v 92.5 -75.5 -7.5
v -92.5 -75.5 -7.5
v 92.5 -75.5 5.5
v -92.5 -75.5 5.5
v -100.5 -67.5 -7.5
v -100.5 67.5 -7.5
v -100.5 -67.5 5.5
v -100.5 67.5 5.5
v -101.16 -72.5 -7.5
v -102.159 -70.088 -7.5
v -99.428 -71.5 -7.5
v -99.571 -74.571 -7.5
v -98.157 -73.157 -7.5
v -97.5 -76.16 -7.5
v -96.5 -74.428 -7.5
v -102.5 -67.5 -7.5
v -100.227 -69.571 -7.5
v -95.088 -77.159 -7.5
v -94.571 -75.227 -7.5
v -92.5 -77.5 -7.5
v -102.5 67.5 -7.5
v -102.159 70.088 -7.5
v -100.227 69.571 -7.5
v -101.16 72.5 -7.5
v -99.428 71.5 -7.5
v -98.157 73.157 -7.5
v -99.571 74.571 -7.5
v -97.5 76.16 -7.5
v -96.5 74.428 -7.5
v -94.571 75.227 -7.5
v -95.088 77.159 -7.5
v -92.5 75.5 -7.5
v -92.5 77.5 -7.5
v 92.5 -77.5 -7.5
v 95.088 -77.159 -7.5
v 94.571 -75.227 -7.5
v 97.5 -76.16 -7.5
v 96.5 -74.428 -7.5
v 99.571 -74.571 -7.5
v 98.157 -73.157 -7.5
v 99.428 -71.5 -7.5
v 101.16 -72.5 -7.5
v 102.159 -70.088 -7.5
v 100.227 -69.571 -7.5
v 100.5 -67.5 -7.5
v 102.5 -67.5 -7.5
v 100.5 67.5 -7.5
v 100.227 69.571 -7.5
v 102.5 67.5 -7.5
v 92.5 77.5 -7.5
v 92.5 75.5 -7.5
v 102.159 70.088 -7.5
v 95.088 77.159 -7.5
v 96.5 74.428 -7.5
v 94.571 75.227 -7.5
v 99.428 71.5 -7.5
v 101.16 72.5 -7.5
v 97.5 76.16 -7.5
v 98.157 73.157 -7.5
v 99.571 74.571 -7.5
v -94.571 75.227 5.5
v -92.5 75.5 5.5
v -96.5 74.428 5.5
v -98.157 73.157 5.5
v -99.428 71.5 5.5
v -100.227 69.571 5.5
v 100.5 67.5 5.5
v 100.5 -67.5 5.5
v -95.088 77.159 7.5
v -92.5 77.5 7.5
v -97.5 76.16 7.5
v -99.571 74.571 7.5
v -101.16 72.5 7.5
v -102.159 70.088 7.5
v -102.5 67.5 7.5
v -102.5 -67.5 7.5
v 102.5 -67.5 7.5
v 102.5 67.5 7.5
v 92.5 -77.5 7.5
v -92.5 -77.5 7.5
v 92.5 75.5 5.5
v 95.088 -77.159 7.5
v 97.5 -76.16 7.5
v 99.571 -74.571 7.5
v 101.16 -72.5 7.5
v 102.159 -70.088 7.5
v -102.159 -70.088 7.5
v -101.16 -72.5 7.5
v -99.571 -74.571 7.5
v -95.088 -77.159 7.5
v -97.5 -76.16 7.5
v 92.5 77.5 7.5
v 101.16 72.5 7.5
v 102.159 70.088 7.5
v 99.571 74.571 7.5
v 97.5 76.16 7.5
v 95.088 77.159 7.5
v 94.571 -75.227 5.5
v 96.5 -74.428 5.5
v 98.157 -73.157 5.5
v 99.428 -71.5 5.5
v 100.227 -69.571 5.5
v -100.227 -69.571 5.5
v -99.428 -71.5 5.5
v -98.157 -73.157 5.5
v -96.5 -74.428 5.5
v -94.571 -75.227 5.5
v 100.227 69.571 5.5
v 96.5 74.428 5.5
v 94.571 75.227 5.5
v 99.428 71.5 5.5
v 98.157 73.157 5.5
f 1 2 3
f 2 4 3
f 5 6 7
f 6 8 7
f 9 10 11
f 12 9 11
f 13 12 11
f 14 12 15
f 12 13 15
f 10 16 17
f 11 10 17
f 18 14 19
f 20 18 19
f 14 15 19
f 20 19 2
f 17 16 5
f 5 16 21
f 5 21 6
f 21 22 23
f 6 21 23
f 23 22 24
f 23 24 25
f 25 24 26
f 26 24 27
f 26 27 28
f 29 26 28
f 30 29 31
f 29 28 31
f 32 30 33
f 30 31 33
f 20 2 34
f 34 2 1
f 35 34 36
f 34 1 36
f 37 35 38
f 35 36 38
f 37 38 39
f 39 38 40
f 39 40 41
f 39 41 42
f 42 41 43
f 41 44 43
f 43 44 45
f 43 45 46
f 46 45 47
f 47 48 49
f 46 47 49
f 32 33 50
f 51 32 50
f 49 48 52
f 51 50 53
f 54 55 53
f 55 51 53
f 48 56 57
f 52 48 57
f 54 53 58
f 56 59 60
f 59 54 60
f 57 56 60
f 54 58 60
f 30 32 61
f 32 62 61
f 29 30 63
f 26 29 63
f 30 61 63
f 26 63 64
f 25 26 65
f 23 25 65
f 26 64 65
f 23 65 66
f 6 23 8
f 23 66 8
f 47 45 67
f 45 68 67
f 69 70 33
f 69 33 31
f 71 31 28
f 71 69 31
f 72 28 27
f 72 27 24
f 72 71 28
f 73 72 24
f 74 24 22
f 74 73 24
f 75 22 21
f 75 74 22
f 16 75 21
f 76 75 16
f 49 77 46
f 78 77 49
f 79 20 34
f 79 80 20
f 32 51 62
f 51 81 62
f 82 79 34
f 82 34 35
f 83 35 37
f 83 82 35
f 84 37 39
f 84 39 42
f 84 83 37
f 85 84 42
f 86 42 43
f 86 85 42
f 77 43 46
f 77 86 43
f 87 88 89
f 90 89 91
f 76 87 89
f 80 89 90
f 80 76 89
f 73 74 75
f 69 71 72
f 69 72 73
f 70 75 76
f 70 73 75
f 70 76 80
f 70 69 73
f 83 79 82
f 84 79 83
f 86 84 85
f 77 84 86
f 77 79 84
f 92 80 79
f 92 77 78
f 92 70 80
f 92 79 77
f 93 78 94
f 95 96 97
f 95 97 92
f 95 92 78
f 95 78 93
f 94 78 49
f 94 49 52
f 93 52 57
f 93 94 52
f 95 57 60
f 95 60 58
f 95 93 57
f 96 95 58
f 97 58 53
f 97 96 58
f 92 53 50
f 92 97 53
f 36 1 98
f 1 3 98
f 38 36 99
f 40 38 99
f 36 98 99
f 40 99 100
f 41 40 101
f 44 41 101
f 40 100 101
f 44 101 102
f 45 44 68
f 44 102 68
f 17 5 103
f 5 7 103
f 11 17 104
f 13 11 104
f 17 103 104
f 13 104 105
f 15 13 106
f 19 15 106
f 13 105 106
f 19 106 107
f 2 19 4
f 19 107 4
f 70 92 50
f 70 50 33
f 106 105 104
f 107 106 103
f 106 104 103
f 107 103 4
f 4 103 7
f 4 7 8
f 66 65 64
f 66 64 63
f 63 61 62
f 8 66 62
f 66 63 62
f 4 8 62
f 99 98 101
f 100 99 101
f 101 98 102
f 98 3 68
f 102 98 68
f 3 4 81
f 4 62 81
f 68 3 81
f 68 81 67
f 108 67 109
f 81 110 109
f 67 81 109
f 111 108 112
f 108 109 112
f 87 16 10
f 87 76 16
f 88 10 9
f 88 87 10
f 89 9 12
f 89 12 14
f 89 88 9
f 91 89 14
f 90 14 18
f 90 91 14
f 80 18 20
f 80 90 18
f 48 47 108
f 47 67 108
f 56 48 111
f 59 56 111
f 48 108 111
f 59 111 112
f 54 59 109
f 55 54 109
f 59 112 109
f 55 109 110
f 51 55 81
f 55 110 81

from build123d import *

# Parameters (mm, degrees)
F1_DEPTH = 7.5
F2_T     = -2


with BuildPart() as f1:
    # F0 (on Top) → F1 (new body, symmetric)
    with BuildSketch(Plane.XY):
        with BuildLine():
            Line((-92.5, -77.5), (92.5, -77.5))
            ThreePointArc((92.5, -77.5), (99.571068, -74.571068), (102.5, -67.5))
            Line((102.5, -67.5), (102.5, 67.5))
            ThreePointArc((102.5, 67.5), (99.571068, 74.571068), (92.5, 77.5))
            Line((92.5, 77.5), (-92.5, 77.5))
            ThreePointArc((-92.5, 77.5), (-99.571068, 74.571068), (-102.5, 67.5))
            Line((-102.5, 67.5), (-102.5, -67.5))
            ThreePointArc((-102.5, -67.5), (-99.571068, -74.571068), (-92.5, -77.5))
        make_face()
    extrude(amount=F1_DEPTH, both=True)

    # F2
    f2_openings = [f1.faces().sort_by_distance(p)[0] for p in [
        (0, 0, -7.5),
    ]]
    offset(amount=F2_T, openings=f2_openings)


solid = f1.part
